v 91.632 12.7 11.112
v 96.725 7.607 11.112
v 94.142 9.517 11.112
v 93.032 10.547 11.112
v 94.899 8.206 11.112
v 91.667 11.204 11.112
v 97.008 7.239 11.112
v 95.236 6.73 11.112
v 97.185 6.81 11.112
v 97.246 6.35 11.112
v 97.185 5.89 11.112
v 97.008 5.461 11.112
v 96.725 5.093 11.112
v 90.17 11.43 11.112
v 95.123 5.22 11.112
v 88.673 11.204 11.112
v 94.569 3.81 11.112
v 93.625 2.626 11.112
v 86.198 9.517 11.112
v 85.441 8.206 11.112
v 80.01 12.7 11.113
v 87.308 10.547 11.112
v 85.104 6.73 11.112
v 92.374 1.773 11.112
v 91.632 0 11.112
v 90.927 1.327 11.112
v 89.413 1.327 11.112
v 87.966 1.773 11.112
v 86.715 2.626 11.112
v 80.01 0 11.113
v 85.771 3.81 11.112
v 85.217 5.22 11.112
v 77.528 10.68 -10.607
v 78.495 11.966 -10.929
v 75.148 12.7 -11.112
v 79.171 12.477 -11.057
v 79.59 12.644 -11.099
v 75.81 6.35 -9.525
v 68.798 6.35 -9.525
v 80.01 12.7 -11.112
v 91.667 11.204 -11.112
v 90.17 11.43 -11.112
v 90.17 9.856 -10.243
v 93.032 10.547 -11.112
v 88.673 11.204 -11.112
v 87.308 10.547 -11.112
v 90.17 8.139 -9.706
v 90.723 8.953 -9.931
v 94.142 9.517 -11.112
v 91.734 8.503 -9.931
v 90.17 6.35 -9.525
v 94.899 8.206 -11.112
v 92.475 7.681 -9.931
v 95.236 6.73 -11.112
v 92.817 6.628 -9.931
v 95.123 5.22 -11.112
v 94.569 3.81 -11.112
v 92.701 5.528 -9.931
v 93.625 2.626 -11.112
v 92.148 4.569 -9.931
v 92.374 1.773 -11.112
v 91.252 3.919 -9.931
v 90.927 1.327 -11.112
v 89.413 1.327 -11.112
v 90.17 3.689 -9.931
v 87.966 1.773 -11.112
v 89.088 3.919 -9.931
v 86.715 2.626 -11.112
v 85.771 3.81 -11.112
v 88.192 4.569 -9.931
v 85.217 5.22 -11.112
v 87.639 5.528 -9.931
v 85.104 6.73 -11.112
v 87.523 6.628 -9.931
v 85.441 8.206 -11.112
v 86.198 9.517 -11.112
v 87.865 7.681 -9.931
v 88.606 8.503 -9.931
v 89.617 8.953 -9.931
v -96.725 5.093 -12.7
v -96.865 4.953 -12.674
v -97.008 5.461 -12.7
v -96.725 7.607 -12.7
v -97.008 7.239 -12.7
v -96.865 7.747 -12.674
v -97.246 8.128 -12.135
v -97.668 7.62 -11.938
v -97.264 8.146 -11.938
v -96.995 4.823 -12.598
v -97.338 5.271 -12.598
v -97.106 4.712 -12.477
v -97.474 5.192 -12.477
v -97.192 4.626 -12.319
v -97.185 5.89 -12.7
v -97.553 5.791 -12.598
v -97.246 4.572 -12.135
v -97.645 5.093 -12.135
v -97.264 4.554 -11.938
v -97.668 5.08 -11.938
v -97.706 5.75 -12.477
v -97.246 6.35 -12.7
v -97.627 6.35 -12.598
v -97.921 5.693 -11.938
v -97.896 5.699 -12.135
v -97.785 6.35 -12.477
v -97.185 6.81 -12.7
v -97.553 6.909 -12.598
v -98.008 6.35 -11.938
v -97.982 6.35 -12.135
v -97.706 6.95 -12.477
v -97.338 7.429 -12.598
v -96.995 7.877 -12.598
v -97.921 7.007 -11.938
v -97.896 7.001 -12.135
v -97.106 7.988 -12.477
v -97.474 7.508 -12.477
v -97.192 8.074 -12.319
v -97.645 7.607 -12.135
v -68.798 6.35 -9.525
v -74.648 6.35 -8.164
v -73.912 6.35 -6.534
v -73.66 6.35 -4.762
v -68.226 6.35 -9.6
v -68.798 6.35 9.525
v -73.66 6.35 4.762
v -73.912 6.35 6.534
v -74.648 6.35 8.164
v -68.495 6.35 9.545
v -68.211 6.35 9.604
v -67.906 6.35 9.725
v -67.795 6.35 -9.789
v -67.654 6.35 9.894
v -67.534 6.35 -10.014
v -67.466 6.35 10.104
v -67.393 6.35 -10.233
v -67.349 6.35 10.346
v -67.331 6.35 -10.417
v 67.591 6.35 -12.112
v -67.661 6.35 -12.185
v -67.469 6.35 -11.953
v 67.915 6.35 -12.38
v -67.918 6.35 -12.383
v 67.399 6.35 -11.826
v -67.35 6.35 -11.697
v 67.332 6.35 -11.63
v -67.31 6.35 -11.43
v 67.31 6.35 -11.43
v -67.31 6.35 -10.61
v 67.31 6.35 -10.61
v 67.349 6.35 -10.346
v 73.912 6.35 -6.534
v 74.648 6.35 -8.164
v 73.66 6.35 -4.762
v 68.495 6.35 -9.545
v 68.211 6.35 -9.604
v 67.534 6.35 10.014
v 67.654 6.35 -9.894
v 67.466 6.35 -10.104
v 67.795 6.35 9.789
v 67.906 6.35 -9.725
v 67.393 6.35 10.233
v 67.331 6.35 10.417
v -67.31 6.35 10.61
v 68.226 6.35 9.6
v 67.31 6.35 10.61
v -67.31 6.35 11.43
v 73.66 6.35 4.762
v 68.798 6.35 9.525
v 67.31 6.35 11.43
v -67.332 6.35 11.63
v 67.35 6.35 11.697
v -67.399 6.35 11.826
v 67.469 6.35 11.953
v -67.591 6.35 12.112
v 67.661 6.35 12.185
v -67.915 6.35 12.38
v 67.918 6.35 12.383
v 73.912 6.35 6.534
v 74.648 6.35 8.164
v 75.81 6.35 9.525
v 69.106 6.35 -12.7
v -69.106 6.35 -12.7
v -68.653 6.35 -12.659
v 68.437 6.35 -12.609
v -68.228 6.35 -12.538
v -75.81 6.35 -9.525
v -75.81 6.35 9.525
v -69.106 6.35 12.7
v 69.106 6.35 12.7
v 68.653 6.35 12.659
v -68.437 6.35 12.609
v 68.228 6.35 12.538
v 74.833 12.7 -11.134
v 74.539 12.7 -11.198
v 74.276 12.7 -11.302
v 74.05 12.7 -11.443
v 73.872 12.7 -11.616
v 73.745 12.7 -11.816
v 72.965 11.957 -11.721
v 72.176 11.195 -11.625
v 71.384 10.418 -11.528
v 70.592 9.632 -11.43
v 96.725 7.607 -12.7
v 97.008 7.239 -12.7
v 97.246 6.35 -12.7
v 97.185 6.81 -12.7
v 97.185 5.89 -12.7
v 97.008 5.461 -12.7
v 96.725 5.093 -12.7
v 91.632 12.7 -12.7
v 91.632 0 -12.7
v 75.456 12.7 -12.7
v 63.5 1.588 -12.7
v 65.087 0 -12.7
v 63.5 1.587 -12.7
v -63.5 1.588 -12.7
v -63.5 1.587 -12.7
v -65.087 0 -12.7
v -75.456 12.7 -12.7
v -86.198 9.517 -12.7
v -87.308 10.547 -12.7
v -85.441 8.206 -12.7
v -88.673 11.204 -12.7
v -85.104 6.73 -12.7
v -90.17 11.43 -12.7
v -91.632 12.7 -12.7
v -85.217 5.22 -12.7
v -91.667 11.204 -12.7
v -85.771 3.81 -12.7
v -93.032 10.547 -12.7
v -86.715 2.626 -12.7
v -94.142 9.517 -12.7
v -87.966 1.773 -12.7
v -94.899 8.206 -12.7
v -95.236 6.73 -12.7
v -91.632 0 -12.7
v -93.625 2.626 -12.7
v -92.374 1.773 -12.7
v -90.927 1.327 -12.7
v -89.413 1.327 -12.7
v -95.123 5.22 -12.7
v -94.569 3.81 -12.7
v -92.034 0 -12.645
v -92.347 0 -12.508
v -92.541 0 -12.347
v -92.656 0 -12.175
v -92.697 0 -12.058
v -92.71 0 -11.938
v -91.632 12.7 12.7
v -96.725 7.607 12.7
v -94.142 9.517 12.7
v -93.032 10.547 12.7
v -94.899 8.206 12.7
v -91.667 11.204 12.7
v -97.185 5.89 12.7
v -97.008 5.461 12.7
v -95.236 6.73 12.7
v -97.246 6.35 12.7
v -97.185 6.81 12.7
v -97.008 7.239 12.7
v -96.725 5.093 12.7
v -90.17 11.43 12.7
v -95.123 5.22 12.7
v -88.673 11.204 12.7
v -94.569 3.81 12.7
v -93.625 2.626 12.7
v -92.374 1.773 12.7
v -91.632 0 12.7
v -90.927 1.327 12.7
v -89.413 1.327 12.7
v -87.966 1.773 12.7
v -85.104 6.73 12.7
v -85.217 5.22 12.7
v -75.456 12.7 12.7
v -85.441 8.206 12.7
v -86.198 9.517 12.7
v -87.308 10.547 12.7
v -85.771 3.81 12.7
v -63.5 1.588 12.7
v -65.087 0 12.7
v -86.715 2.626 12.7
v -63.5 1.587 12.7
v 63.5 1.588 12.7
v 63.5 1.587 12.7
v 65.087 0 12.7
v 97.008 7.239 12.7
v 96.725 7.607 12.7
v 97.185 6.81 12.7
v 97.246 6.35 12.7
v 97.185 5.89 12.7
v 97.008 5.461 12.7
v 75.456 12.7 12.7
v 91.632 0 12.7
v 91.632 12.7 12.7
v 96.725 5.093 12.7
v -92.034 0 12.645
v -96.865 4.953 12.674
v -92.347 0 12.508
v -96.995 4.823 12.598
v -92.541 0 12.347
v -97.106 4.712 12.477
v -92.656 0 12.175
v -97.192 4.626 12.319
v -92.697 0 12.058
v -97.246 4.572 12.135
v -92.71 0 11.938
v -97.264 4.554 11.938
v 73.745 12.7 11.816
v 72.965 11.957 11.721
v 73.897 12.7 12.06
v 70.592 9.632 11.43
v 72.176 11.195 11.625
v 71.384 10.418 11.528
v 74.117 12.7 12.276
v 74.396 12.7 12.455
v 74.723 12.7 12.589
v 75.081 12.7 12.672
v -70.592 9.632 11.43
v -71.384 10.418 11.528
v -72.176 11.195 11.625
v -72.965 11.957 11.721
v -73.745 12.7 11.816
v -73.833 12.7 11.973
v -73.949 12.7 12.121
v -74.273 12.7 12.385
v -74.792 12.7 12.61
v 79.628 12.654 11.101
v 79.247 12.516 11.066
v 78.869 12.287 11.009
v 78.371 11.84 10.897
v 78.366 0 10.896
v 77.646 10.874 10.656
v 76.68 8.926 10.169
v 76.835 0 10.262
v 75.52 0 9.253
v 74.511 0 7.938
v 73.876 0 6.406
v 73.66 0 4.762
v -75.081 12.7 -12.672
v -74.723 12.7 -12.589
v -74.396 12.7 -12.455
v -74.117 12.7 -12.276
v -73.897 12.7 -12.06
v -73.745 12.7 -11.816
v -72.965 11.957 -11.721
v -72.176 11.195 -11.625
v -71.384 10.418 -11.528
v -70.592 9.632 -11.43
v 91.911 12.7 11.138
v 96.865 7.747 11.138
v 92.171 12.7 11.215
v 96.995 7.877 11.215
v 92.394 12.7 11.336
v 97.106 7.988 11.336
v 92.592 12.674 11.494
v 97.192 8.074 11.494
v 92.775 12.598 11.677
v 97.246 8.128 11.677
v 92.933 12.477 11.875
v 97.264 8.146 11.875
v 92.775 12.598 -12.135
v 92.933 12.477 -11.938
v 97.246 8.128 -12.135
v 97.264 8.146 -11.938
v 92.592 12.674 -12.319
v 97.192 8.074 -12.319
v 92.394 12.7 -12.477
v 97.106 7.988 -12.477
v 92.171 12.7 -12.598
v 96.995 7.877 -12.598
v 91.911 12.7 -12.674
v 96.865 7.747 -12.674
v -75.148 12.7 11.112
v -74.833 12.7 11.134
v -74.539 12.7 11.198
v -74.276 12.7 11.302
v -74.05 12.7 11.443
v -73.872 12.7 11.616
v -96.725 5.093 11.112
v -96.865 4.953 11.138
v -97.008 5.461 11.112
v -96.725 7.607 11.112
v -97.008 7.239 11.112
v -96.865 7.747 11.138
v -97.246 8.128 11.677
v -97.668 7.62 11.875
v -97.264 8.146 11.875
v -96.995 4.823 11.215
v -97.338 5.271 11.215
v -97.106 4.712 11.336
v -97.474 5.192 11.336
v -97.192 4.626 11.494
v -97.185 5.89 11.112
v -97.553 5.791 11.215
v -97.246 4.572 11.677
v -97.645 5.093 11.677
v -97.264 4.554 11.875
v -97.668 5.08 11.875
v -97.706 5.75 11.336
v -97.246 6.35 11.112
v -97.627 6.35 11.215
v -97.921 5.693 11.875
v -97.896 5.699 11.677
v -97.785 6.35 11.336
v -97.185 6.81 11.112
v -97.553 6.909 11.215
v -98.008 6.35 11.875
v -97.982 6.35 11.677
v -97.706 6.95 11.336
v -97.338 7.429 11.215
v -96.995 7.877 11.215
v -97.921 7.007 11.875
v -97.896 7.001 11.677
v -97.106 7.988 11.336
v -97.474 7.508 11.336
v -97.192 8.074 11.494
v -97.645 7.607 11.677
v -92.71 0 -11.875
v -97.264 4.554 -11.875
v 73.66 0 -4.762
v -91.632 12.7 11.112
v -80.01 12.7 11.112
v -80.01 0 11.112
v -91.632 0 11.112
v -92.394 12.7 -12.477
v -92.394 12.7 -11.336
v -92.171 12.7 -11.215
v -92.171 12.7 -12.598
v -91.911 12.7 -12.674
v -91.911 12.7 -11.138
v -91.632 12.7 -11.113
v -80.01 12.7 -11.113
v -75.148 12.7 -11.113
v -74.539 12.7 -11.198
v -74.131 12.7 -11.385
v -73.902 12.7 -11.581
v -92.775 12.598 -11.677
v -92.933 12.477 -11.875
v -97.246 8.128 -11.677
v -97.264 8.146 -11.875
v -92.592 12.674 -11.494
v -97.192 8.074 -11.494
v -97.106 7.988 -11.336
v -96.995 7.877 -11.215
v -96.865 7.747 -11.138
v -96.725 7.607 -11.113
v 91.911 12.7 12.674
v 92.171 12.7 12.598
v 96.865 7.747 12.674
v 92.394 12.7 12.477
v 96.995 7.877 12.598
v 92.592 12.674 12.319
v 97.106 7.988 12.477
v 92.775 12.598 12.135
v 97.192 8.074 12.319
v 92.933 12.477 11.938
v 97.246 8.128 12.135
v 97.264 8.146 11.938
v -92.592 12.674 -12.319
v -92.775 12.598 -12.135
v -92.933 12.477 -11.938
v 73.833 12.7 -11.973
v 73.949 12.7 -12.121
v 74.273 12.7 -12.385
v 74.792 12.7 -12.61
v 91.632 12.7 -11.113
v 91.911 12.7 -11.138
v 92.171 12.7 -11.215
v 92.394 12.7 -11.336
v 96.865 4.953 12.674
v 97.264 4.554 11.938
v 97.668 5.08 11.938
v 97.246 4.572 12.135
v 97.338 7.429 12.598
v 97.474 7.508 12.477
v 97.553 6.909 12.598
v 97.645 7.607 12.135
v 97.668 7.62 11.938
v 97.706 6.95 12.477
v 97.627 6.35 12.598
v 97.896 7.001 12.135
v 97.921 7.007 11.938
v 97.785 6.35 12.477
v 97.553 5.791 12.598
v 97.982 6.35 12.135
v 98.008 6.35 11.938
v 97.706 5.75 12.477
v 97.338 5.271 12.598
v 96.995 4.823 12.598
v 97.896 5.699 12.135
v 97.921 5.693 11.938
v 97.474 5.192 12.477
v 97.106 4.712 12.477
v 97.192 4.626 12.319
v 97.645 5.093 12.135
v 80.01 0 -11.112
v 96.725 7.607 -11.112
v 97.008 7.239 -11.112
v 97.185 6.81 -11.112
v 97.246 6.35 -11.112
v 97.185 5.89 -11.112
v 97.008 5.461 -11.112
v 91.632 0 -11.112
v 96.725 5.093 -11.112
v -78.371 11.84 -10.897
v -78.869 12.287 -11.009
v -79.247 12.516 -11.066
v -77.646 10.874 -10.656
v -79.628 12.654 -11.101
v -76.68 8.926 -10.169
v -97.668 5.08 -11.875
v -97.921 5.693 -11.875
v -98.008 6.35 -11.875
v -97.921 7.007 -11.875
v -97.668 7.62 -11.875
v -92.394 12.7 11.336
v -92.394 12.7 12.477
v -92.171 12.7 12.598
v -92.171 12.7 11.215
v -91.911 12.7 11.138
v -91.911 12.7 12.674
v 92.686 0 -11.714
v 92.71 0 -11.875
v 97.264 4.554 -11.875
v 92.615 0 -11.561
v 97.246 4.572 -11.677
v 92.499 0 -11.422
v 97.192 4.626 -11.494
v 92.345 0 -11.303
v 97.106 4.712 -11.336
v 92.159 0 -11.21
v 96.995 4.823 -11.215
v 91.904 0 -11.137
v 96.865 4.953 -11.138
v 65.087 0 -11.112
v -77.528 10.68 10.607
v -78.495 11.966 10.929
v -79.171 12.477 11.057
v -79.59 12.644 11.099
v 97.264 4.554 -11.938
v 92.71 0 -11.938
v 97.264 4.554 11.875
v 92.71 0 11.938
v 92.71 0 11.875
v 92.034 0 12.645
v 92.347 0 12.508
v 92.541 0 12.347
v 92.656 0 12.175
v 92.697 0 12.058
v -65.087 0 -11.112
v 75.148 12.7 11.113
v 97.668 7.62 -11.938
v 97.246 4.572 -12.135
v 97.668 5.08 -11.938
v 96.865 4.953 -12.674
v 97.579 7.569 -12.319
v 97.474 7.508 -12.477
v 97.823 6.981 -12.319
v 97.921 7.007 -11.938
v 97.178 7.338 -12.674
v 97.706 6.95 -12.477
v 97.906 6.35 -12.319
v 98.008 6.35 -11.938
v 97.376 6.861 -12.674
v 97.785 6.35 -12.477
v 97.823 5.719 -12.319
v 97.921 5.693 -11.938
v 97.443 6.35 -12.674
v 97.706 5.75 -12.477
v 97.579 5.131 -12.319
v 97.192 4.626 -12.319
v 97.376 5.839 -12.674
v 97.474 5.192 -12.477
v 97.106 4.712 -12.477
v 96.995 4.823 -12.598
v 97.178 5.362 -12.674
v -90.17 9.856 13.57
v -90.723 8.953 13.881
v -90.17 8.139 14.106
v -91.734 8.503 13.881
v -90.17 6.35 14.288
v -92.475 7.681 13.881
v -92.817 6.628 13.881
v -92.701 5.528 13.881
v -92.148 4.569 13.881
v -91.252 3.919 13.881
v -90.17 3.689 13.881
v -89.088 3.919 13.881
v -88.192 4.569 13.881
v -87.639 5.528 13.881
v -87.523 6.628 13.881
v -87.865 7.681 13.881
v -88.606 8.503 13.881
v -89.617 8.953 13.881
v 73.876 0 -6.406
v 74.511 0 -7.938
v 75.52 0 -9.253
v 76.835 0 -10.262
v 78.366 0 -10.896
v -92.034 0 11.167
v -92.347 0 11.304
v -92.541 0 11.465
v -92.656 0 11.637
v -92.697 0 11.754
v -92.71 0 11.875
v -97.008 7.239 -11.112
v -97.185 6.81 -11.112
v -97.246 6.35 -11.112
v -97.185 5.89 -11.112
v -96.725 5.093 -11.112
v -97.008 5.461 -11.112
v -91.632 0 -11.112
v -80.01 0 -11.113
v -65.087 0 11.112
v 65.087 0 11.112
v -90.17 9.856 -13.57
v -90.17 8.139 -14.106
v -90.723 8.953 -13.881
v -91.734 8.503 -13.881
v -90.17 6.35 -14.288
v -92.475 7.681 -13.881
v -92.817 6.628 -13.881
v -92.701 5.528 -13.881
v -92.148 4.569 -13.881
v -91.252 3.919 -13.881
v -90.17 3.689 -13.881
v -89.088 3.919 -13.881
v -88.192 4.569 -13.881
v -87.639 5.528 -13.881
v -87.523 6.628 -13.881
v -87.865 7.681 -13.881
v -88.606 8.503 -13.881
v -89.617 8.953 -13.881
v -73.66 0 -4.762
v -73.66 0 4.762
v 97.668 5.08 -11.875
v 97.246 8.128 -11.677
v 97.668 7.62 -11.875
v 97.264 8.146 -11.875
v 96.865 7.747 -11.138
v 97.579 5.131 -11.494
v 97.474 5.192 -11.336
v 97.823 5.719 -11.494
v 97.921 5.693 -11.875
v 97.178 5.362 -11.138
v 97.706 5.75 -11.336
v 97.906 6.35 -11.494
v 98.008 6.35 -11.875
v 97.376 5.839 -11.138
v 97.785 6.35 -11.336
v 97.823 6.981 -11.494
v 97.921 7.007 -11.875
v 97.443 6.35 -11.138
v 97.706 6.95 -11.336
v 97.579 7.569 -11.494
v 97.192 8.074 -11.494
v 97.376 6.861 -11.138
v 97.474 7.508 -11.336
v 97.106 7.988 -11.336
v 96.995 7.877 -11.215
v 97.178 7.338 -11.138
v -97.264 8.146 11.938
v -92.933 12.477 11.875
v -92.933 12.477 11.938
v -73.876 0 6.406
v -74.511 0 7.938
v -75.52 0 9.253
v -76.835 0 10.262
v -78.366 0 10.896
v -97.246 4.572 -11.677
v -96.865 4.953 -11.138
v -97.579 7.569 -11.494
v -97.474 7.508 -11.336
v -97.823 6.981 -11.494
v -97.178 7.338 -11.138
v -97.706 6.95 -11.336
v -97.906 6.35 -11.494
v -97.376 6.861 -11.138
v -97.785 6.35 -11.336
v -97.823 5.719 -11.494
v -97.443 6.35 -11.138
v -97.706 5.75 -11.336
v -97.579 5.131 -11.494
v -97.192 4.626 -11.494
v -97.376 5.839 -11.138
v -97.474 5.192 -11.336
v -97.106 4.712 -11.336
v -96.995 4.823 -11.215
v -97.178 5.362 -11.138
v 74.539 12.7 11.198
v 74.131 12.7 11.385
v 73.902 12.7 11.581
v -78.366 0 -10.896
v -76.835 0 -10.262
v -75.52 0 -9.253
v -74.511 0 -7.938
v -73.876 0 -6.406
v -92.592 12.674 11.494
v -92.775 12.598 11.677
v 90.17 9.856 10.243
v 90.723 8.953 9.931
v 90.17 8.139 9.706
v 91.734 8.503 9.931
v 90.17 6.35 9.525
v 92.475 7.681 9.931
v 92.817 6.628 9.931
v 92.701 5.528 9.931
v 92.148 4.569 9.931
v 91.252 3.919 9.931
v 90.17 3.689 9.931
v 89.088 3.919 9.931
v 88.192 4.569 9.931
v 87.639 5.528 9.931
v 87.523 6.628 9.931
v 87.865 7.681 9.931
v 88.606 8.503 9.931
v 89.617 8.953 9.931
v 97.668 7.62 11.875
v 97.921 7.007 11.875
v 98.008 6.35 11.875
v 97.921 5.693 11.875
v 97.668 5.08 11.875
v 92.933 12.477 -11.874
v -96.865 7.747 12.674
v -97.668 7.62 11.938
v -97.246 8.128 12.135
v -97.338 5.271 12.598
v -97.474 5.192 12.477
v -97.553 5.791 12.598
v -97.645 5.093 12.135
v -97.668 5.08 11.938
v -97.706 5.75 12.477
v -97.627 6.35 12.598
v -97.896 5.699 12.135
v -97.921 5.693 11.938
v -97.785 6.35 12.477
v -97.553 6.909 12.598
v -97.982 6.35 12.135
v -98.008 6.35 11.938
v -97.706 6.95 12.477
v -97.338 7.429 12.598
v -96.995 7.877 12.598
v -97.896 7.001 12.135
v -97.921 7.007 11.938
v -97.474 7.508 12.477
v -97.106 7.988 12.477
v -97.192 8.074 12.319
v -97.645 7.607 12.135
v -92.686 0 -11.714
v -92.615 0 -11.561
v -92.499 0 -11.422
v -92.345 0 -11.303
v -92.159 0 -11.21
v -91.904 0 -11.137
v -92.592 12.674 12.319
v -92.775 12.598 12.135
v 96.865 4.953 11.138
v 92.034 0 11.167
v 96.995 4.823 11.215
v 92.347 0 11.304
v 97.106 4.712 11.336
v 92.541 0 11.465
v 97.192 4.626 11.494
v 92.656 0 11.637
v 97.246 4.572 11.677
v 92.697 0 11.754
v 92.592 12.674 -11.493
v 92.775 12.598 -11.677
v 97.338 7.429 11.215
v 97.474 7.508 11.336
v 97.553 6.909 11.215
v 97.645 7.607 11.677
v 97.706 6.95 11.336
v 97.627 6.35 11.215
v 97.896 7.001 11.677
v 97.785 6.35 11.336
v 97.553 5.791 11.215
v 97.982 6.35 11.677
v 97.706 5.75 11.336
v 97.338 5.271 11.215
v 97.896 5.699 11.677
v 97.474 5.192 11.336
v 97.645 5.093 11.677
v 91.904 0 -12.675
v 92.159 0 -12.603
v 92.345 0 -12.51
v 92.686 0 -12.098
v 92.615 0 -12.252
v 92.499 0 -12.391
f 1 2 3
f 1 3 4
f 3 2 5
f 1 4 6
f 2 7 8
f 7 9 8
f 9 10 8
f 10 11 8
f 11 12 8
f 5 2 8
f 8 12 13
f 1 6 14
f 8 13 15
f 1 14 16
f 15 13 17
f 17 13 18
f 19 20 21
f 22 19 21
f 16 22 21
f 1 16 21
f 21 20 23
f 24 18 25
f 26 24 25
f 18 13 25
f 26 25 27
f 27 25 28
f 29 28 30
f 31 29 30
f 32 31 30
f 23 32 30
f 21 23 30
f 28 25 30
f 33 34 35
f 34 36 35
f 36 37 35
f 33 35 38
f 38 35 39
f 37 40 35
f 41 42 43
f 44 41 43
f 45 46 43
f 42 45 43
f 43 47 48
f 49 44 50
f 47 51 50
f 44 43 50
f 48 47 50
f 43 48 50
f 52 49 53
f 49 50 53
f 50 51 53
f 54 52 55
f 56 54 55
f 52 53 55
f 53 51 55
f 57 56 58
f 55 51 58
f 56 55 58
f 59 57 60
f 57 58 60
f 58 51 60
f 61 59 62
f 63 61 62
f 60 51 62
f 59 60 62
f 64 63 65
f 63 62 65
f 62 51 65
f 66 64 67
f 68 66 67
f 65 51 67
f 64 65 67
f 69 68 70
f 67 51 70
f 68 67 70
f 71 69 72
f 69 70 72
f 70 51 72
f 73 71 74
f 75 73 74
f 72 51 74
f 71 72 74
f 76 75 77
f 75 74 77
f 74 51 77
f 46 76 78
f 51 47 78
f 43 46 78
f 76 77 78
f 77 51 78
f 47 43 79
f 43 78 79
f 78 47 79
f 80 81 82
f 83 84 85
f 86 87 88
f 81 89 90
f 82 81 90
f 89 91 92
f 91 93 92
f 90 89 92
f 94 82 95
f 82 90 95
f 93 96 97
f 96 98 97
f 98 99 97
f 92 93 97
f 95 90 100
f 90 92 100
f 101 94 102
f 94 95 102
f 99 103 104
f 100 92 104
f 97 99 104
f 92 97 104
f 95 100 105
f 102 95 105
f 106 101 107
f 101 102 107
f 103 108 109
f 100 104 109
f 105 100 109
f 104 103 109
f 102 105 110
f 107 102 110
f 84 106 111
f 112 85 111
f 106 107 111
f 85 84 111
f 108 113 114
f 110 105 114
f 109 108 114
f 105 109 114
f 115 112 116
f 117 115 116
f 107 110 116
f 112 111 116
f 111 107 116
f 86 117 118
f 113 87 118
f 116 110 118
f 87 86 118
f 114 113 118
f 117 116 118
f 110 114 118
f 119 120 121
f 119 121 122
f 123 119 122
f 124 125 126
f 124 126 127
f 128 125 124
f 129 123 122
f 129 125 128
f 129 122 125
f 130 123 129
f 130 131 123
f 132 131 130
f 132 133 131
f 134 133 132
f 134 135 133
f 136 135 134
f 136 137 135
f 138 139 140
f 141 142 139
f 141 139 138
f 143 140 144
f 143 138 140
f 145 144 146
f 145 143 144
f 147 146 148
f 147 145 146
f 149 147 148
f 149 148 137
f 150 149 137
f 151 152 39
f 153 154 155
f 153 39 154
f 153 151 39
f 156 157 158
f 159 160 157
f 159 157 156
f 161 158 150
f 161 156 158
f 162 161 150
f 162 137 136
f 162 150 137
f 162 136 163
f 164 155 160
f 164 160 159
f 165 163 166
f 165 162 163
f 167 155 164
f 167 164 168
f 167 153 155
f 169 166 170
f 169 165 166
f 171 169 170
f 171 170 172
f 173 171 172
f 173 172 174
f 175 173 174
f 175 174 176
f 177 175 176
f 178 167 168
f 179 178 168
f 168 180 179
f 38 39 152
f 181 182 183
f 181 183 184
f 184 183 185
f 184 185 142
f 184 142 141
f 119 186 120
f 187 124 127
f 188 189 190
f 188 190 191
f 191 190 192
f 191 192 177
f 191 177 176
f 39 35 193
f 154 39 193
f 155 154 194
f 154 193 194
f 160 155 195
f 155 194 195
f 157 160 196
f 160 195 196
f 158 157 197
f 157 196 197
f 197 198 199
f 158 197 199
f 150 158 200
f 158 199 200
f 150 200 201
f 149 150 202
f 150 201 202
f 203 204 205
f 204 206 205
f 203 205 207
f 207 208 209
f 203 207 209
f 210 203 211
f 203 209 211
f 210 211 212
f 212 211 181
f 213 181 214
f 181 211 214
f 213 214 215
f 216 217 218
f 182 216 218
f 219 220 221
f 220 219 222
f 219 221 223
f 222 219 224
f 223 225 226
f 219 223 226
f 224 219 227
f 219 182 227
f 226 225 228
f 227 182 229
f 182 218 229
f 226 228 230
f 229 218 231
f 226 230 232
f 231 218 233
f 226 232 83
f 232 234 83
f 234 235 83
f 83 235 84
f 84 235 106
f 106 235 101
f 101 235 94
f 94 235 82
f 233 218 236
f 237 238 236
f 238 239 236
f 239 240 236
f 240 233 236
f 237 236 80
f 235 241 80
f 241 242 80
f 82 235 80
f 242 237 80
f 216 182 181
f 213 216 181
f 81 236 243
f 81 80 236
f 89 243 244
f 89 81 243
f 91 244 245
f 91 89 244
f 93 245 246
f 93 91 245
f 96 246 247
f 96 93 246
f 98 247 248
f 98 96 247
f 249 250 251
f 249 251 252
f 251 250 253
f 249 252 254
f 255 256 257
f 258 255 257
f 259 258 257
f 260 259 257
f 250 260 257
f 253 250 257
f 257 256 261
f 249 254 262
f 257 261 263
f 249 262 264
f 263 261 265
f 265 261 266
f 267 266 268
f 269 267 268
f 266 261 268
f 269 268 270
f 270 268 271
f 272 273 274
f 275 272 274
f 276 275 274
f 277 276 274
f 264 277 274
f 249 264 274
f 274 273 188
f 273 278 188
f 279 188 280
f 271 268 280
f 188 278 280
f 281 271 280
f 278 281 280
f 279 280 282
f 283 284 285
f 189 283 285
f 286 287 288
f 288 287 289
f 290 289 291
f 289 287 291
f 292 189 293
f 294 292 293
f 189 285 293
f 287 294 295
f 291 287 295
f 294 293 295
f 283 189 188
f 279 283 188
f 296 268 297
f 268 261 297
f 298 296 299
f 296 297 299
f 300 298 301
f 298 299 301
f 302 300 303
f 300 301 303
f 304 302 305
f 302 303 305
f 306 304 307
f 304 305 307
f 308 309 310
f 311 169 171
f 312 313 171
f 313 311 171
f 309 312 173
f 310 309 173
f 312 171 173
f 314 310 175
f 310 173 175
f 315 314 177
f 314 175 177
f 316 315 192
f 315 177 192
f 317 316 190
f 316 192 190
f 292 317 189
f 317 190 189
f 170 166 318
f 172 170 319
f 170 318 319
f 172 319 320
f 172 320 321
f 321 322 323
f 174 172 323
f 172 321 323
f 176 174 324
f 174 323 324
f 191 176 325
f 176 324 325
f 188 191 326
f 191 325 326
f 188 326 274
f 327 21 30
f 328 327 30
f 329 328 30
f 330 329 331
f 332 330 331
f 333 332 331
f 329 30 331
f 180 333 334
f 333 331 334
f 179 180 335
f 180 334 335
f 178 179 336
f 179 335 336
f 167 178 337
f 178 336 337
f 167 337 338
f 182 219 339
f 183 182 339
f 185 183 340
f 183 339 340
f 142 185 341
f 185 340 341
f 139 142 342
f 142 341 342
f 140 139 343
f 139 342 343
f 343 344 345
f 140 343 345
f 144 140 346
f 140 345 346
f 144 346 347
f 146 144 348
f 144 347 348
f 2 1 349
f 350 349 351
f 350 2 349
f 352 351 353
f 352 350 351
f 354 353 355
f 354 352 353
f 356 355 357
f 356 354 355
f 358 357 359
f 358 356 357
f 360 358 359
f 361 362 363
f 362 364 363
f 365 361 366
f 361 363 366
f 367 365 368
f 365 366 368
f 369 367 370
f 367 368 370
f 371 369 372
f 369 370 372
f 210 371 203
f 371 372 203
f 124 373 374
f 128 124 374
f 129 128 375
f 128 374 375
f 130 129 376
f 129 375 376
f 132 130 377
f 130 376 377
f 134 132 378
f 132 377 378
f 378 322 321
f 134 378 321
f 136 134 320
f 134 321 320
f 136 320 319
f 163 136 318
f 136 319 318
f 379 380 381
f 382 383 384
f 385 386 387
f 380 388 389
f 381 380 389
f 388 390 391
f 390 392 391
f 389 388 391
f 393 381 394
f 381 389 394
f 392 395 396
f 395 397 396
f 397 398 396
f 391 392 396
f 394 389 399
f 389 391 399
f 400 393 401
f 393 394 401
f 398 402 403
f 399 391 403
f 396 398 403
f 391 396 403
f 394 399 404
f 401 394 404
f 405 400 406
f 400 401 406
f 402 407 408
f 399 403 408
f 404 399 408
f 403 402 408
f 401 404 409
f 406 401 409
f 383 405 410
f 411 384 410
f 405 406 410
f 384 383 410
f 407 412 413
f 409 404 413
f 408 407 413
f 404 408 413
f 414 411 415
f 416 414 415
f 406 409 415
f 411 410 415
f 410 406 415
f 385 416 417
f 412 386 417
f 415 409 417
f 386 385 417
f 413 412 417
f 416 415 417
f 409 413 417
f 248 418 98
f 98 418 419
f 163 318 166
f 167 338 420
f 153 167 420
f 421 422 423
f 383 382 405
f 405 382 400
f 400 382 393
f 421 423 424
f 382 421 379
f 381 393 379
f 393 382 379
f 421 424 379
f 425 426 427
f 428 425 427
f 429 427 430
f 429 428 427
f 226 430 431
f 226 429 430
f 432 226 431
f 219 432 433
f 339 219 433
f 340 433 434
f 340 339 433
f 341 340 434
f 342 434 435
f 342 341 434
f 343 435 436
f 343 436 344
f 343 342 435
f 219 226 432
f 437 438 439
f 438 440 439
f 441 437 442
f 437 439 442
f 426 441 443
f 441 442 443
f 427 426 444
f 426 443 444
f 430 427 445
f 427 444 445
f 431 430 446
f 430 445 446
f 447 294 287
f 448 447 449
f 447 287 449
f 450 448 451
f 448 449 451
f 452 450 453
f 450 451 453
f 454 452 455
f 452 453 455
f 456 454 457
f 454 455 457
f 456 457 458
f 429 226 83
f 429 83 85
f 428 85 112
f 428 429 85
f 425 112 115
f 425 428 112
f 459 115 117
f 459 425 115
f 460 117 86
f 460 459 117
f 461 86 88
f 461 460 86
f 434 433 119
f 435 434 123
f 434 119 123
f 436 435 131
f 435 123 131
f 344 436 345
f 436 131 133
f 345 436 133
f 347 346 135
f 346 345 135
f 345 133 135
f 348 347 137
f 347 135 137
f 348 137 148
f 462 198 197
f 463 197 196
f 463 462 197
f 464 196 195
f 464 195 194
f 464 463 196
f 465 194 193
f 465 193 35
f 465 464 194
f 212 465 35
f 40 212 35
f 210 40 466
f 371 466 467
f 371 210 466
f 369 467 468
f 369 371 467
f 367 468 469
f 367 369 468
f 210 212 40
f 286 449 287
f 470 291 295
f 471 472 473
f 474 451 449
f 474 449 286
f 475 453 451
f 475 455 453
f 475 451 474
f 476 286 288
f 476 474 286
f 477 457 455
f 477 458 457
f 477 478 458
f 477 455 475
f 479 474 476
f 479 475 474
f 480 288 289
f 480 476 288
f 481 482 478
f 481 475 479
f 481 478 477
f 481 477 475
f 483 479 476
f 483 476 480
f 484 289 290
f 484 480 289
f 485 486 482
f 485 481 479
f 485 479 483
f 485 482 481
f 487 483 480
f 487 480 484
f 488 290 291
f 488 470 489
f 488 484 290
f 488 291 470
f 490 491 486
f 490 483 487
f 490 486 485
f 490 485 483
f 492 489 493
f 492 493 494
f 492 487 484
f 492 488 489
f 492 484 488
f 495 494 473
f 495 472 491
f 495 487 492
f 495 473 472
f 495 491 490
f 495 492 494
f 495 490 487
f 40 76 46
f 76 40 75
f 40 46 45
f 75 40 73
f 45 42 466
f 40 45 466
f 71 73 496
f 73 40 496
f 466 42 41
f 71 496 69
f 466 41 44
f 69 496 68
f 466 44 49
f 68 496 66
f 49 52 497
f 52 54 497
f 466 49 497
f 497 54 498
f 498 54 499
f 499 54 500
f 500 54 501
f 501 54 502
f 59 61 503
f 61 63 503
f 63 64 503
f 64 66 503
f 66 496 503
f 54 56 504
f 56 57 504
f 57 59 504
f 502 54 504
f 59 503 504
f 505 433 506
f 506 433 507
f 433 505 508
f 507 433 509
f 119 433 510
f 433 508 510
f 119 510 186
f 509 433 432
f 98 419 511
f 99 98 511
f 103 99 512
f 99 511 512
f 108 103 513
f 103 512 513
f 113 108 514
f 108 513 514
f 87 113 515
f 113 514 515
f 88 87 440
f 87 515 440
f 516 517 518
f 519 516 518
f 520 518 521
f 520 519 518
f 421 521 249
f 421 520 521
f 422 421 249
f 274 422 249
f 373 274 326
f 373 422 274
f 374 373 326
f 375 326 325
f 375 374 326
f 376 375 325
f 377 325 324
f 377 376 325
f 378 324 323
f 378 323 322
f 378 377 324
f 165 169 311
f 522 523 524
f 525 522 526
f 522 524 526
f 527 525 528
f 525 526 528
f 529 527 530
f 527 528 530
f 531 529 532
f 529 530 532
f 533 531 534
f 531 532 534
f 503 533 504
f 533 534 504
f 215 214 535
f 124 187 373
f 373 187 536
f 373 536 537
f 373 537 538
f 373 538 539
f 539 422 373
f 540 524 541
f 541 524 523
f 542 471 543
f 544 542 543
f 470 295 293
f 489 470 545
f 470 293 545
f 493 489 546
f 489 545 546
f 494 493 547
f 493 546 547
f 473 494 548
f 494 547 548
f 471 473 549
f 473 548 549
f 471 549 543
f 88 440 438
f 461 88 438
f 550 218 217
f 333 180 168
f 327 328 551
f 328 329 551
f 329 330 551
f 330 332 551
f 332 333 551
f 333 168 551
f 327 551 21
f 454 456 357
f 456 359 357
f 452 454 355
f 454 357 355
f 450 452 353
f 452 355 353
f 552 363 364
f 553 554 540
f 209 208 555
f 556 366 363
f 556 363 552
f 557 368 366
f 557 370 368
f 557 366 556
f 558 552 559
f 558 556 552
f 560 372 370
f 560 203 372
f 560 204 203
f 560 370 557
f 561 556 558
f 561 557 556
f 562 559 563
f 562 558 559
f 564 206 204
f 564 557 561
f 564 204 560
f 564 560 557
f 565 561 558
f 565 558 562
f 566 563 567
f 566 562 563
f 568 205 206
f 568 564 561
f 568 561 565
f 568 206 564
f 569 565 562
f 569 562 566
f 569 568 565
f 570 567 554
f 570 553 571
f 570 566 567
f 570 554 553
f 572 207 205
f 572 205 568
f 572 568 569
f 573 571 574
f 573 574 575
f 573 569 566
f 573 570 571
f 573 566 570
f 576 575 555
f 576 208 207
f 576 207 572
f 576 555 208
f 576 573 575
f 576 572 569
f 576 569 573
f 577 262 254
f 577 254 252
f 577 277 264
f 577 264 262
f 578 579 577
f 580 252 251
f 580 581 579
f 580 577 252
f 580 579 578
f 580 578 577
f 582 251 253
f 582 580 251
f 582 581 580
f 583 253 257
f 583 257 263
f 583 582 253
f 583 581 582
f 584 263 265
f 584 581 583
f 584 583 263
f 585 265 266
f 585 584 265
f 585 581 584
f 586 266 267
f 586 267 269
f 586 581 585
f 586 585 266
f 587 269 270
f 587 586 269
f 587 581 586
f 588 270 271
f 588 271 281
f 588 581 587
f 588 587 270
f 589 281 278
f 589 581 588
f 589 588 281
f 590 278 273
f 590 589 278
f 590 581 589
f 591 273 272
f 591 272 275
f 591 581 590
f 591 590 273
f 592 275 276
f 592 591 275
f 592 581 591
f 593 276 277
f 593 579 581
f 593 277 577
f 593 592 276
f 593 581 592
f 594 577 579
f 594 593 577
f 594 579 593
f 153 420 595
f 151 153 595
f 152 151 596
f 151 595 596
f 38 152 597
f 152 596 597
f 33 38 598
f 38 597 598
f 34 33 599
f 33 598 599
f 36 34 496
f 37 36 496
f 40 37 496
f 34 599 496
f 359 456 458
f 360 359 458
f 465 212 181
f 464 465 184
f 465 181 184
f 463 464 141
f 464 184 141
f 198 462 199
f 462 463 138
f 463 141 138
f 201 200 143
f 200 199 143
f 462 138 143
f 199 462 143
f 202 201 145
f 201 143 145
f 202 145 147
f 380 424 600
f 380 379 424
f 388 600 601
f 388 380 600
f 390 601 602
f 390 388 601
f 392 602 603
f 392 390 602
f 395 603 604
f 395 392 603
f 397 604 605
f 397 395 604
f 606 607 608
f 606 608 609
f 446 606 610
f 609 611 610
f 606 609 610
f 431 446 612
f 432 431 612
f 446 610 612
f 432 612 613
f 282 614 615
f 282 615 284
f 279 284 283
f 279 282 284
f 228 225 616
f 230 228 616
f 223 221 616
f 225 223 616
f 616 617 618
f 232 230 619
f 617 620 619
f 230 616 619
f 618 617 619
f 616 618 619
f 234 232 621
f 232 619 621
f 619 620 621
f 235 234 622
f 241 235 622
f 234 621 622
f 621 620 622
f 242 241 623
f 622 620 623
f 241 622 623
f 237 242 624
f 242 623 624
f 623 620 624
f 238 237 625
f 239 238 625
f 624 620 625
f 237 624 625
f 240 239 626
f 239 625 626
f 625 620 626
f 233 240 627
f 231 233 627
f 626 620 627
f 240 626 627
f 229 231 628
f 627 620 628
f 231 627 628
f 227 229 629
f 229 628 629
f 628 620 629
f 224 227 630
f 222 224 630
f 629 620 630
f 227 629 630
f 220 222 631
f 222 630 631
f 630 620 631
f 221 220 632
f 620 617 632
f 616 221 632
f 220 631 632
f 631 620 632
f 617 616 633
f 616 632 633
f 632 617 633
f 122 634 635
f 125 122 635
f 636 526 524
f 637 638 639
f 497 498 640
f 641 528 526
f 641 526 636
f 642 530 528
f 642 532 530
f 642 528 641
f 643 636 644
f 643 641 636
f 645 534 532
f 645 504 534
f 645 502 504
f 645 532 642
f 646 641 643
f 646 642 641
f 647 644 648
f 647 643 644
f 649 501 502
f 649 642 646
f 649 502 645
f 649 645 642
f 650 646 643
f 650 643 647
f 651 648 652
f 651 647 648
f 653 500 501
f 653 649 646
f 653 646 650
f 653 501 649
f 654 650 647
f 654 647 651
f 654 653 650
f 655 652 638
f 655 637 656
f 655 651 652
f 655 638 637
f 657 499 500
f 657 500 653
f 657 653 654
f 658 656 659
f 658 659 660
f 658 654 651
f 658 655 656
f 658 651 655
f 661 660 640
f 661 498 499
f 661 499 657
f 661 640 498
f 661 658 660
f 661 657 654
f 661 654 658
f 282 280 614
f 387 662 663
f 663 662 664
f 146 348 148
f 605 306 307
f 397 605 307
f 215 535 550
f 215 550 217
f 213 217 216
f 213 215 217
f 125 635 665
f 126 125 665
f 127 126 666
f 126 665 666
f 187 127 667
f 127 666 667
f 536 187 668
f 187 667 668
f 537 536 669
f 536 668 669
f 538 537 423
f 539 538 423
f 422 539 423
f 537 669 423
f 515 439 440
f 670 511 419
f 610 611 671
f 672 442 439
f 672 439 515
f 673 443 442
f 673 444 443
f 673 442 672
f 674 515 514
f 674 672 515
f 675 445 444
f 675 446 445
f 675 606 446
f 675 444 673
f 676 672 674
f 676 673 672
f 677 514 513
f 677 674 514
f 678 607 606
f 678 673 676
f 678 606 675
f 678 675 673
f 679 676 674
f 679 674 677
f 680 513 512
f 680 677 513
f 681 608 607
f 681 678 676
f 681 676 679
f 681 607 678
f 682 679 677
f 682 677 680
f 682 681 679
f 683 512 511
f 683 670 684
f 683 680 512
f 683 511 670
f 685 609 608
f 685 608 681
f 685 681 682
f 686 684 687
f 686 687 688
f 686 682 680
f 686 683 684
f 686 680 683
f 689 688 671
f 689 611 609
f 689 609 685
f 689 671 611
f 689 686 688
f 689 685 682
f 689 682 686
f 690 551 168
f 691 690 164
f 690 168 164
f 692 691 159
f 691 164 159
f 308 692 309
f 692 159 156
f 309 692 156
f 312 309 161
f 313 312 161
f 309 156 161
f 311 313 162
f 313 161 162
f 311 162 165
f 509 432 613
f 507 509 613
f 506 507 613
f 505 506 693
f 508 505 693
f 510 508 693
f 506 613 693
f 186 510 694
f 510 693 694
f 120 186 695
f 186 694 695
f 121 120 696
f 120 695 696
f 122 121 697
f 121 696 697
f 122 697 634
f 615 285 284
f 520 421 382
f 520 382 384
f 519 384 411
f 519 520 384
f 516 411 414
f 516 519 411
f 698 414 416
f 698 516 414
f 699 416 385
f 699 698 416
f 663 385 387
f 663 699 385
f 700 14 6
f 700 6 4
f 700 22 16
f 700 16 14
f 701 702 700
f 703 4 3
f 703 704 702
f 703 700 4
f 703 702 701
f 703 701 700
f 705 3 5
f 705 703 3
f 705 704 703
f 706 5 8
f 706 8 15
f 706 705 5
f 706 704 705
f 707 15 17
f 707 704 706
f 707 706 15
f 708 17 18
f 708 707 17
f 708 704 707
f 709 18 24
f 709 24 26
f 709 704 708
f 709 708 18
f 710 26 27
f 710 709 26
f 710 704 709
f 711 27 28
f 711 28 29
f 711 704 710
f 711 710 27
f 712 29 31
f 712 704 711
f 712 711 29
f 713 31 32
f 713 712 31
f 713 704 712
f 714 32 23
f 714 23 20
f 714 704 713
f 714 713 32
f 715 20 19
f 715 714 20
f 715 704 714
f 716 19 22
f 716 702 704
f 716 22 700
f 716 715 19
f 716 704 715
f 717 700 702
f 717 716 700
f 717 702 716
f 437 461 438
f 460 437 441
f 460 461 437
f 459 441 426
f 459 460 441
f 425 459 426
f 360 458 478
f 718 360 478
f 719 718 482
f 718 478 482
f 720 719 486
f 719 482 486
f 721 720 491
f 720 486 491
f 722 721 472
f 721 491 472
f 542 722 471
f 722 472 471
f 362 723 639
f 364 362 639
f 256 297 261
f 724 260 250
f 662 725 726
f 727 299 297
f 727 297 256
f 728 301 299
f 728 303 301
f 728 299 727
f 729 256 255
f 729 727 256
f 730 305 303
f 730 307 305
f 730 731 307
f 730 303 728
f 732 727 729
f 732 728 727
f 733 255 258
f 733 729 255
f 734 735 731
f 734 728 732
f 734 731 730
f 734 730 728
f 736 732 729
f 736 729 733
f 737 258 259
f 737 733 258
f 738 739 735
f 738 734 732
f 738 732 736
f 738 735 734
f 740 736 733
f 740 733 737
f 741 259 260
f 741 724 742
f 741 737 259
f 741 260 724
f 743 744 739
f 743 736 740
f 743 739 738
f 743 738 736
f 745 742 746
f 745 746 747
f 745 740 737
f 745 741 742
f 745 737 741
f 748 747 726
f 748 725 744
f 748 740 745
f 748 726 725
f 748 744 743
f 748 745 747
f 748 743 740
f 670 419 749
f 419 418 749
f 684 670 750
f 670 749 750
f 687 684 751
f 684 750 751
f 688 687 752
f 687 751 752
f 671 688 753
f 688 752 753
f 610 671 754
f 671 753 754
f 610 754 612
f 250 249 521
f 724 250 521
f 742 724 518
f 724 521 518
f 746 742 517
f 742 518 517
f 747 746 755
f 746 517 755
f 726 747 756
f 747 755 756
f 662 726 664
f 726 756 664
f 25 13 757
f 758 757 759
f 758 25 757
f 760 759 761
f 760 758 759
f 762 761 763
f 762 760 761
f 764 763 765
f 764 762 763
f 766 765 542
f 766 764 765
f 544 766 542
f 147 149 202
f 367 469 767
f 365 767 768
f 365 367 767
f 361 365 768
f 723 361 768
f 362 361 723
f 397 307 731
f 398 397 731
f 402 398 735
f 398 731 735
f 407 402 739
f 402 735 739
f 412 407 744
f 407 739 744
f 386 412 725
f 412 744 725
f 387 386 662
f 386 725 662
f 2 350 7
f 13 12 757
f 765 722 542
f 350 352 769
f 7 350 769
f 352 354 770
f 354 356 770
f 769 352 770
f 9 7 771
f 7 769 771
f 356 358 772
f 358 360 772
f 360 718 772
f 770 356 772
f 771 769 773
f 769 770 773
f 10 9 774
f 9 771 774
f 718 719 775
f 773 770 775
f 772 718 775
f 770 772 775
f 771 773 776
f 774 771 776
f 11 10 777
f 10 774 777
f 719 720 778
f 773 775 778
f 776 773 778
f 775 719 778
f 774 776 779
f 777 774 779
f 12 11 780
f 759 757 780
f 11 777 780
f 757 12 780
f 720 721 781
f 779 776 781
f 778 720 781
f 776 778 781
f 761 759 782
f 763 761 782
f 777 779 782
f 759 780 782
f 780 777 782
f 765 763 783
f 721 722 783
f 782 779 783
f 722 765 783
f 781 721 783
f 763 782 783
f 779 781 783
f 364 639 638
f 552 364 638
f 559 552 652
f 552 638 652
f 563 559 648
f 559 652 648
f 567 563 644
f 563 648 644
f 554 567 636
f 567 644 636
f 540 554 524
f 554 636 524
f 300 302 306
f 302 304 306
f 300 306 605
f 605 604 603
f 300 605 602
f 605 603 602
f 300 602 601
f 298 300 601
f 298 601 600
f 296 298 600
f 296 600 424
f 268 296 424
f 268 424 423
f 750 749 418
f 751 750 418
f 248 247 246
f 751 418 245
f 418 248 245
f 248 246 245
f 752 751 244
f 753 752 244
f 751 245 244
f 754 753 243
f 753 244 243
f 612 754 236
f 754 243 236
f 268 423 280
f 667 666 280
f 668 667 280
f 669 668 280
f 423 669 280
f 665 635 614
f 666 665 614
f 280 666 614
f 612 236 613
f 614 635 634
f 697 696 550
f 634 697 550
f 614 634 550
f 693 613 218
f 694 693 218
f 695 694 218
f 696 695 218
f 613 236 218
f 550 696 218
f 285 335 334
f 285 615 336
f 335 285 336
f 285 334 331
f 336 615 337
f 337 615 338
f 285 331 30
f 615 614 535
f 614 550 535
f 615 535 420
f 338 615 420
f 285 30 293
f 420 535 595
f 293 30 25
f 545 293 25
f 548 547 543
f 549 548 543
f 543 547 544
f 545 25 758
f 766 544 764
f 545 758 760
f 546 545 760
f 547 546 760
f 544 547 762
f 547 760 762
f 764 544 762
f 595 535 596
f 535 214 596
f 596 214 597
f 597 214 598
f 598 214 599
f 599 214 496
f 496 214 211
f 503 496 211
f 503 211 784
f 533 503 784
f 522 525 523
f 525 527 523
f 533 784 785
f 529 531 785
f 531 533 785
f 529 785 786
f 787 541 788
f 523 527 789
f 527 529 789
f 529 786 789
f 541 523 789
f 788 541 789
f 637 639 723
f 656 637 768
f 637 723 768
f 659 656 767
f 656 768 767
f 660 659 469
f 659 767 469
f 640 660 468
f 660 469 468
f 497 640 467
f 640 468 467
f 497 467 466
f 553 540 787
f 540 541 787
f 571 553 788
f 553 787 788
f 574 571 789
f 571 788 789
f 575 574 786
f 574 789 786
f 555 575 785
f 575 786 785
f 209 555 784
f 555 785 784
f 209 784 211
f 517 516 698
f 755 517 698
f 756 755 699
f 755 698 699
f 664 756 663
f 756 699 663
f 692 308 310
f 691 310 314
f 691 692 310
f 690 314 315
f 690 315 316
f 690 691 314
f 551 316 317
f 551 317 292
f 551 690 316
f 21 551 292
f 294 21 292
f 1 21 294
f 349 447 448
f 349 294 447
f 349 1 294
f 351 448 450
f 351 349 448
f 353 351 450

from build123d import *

# Parameters (mm, degrees)
BOSS_EXTRUDE1_DEPTH = 12.7
CUT_EXTRUDE2_DEPTH  = 199.932436772
CUT_EXTRUDE1_DEPTH  = 104.050150898
CUT_EXTRUDE3_DEPTH  = 63.5
CHAMFER1_SIZE       = 1.5875
FILLET1_R           = 0.762
FILLET2_R           = 1.27


# Some blends are built 0.0001 mm under size
with BuildPart() as part:
    # Sketch1 → Boss-Extrude1 (new body)
    with BuildSketch(Plane(origin=(0, 0, 0), x_dir=(1, 0, 0), z_dir=(0, 1, 0))):
        with BuildLine():
            Line((-99.06, -12.7), (99.06, -12.7))
            Line((99.06, -12.7), (99.06, -11.1125))
            Line((99.06, -11.1125), (80.01, -11.1125))
            ThreePointArc((80.01, -11.1125), (75.519871939, -9.252628061), (73.66, -4.7625))
            Line((73.66, -4.7625), (73.66, 4.7625))
            ThreePointArc((73.66, 4.7625), (75.519871939, 9.252628061), (80.01, 11.1125))
            Line((80.01, 11.1125), (99.06, 11.1125))
            Line((99.06, 11.1125), (99.06, 12.7))
            Line((99.06, 12.7), (-99.06, 12.7))
            Line((-99.06, 12.7), (-99.06, 11.1125))
            Line((-99.06, 11.1125), (-80.01, 11.1125))
            ThreePointArc((-80.01, 11.1125), (-75.519871939, 9.252628061), (-73.66, 4.7625))
            Line((-73.66, 4.7625), (-73.66, -4.7625))
            ThreePointArc((-73.66, -4.7625), (-75.519871939, -9.252628061), (-80.01, -11.1125))
            Line((-80.01, -11.1125), (-99.06, -11.1125))
            Line((-99.06, -11.1125), (-99.06, -12.7))
        make_face()
    extrude(amount=BOSS_EXTRUDE1_DEPTH)

    # Sketch3 → Cut-Extrude2 (cut, through all)
    with BuildSketch(Plane.ZY.offset(99.06)):
        Polygon((11.1125, 12.7), (4.7625, 12.7), (-4.7625, 12.7), (-11.1125, 12.7), (-9.525, 6.35), (9.525, 6.35), align=None)
    extrude(amount=-CUT_EXTRUDE2_DEPTH, mode=Mode.SUBTRACT)

    # Sketch2 → Cut-Extrude1 (cut, through all)
    with BuildSketch(Plane.XY.offset(12.7)):
        Polygon((73.66, 12.7), (-73.66, 12.7), (-67.31, 6.35), (67.31, 6.35), align=None)
        with BuildLine():
            Line((97.263948776, 4.553948776), (92.71, 0))
            Line((92.71, 0), (99.06, 0))
            Line((99.06, 0), (99.06, 12.7))
            Line((99.06, 12.7), (92.71, 12.7))
            Line((92.71, 12.7), (97.263948776, 8.146051224))
            ThreePointArc((97.263948776, 8.146051224), (98.007897552, 6.35), (97.263948776, 4.553948776))
        make_face()
        with BuildLine():
            ThreePointArc((-97.263948776, 4.553948776), (-98.007897552, 6.35), (-97.263948776, 8.146051224))
            Line((-97.263948776, 8.146051224), (-92.71, 12.7))
            Line((-92.71, 12.7), (-99.06, 12.7))
            Line((-99.06, 12.7), (-99.06, 0))
            Line((-99.06, 0), (-92.71, 0))
            Line((-92.71, 0), (-97.263948776, 4.553948776))
        make_face()
    extrude(amount=-CUT_EXTRUDE1_DEPTH, mode=Mode.SUBTRACT)

    # Sketch4 → Revolve1 (revolve)
    with BuildSketch(Plane.ZY.offset(90.17)):
        with BuildLine():
            Line((12.7, 6.35), (12.7, 11.43))
            ThreePointArc((12.7, 11.43), (13.881381744, 9.01113492), (14.2875, 6.35))
            Line((14.2875, 6.35), (12.7, 6.35))
        make_face()
    revolve1 = revolve(axis=Axis((-90.17, 6.35, 0), (0, 0, 1)))

    # Mirror1: Revolve1 across plane
    add(revolve1.mirror(Plane.XY))

    # Sketch5 → Revolve2 (revolve)
    with BuildSketch(Plane(origin=(90.17, 0, 0), x_dir=(0, 0, -1), z_dir=(1, 0, 0))):
        with BuildLine():
            Line((11.1125, 6.35), (11.1125, 11.43))
            ThreePointArc((11.1125, 11.43), (9.931118256, 9.01113492), (9.525, 6.35))
            Line((9.525, 6.35), (11.1125, 6.35))
        make_face()
    revolve2 = revolve(axis=Axis((90.17, 6.35, 0), (0, 0, -1)))

    # Mirror2: Revolve2 across plane
    add(revolve2.mirror(Plane.XY))

    # Sketch6 → Cut-Extrude3 (cut, symmetric)
    with BuildSketch(Plane(origin=(0, 0, 0), x_dir=(0, 0, -1), z_dir=(1, 0, 0))):
        Polygon((-12.7, 0), (-11.1125, 0), (-12.7, 1.5875), align=None)
        Polygon((11.1125, 0), (12.7, 1.5875), (12.7, 0), align=None)
    extrude(amount=CUT_EXTRUDE3_DEPTH, both=True, mode=Mode.SUBTRACT)

    # Chamfer1
    chamfer1_edges = [part.edges().sort_by_distance(p)[0] for p in [
        (63.5, 0, 11.90625),
        (63.5, 0, -11.90625),
        (-63.5, 0, -11.90625),
        (-63.5, 0, 11.90625),
    ]]
    chamfer(chamfer1_edges, length=CHAMFER1_SIZE - 0.0001)  # a hair under: the kernel refuses the full size

    # Fillet1
    fillet1_edges = [part.edges().sort_by_distance(p)[0] for p in [
        (-98.007897552, 6.35, 12.7),
        (-92.71, 12.7, -11.90625),
        (-94.986974388, 10.423025612, -11.1125),
        (-94.986974388, 10.423025612, -12.7),
        (-94.986974388, 10.423025612, 11.1125),
        (-92.71, 12.7, 11.90625),
        (-94.986974388, 2.276974388, 12.7),
        (-98.007897552, 6.35, -11.1125),
        (-98.007897552, 6.35, 11.1125),
        (-94.986974388, 2.276974388, -11.1125),
        (-94.986974388, 2.276974388, 11.1125),
        (-98.007897552, 6.35, -12.7),
        (-94.986974388, 2.276974388, -12.7),
        (-94.986974388, 10.423025612, 12.7),
        (98.007897552, 6.35, 12.7),
        (92.71, 12.7, 11.90625),
        (92.71, 12.7, -11.90625),
        (94.986974388, 10.423025612, 12.7),
        (94.986974388, 2.276974388, 11.1125),
        (94.986974388, 2.276974388, -11.1125),
        (94.986974388, 2.276974388, -12.7),
        (98.007897552, 6.35, 11.1125),
        (94.986974388, 10.423025612, 11.1125),
        (94.986974388, 10.423025612, -11.1125),
        (98.007897552, 6.35, -12.7),
        (94.986974388, 10.423025612, -12.7),
        (94.986974388, 2.276974388, 12.7),
        (98.007897552, 6.35, -11.1125),
    ]]
    fillet(fillet1_edges, radius=FILLET1_R)

    # Fillet2
    # the kernel refuses this fillet: 1.27 mm, written as the material it takes off along each edge
    with BuildSketch(Plane(origin=(-75.90506403, 14.94506403, -12.7), x_dir=(-0.7071067811865446, -0.7071067811865505, 0), z_dir=(0.7071067811865506, -0.7071067811865446, 0))) as fillet2_piece_1_section:
        with BuildLine():
            CenterArc((FILLET2_R, -FILLET2_R), FILLET2_R, 90, 90)
            Line((0, -FILLET2_R), (0, 0))
            Line((0, 0), (FILLET2_R, 0))
        make_face()
    fillet2_piece_1 = extrude(amount=15.330256121, mode=Mode.PRIVATE)
    fillet2_piece_1 = split(fillet2_piece_1, bisect_by=Plane(origin=(-71.905795305, 6.35, -12.408746665), z_dir=(0, 1, 0)), keep=Keep.TOP, mode=Mode.PRIVATE)
    add(fillet2_piece_1, mode=Mode.SUBTRACT)
    with BuildSketch(Plane(origin=(-65.450815483, 4.490815483, -9.060203871), x_dir=(0.1230914909792504, -0.12309149097924957, -0.9847319278346824), z_dir=(-0.696310623822809, 0.6963106238228031, -0.17407765595558086))) as fillet2_piece_2_section:
        with BuildLine():
            CenterArc((FILLET2_R * 0.840960781889, FILLET2_R), FILLET2_R, 189.874961398, 80.125038602)
            Line((-FILLET2_R * 0.144223584254, FILLET2_R * 0.828501414858), (0, 0))
            Line((0, 0), (FILLET2_R * 0.840960781889, 0))
        make_face()
    fillet2_piece_2 = extrude(amount=14.459594166, mode=Mode.PRIVATE)
    fillet2_piece_2 = split(fillet2_piece_2, bisect_by=Plane(origin=(-71.646234354, 6.35, -10.770930609), z_dir=(0, 1, 0)), keep=Keep.TOP, mode=Mode.PRIVATE)
    add(fillet2_piece_2, mode=Mode.SUBTRACT)
    with BuildSketch(Plane(origin=(-75.519184517, 14.559184517, 11.577296129), x_dir=(-0.7177405625652845, -0.6755205294731655, -0.1688801323683837), z_dir=(0.69631062382278, -0.6963106238227741, -0.17407765595581334))) as fillet2_piece_3_section:
        with BuildLine():
            CenterArc((FILLET2_R * 0.840960781889, -FILLET2_R), FILLET2_R, 90, 80.125038602)
            Line((-FILLET2_R * 0.144223584254, -FILLET2_R * 0.828501414857), (0, 0))
            Line((0, 0), (FILLET2_R * 0.840960781889, 0))
        make_face()
    fillet2_piece_3 = extrude(amount=14.459594166, mode=Mode.PRIVATE)
    fillet2_piece_3 = split(fillet2_piece_3, bisect_by=Plane(origin=(-71.646234354, 6.35, 10.770930609), z_dir=(0, 1, 0)), keep=Keep.TOP, mode=Mode.PRIVATE)
    add(fillet2_piece_3, mode=Mode.SUBTRACT)
    with BuildSketch(Plane(origin=(-75.90506403, 14.94506403, 12.7), x_dir=(-0.7071067811865445, -0.7071067811865505, 0), z_dir=(0.7071067811865506, -0.7071067811865446, 0))) as fillet2_piece_4_section:
        with BuildLine():
            CenterArc((FILLET2_R, FILLET2_R), FILLET2_R, 180, 90)
            Line((0, FILLET2_R), (0, 0))
            Line((0, 0), (FILLET2_R, 0))
        make_face()
    fillet2_piece_4 = extrude(amount=15.330256121, mode=Mode.PRIVATE)
    fillet2_piece_4 = split(fillet2_piece_4, bisect_by=Plane(origin=(-71.905795305, 6.35, 12.408746665), z_dir=(0, 1, 0)), keep=Keep.TOP, mode=Mode.PRIVATE)
    add(fillet2_piece_4, mode=Mode.SUBTRACT)
    with BuildSketch(Plane(origin=(65.06493597, 4.10493597, -12.7), x_dir=(0.7071067811865445, -0.7071067811865506, 0), z_dir=(0.7071067811865506, 0.7071067811865445, 0))) as fillet2_piece_5_section:
        with BuildLine():
            CenterArc((FILLET2_R, -FILLET2_R), FILLET2_R, 90, 90)
            Line((0, -FILLET2_R), (0, 0))
            Line((0, 0), (FILLET2_R, 0))
        make_face()
    fillet2_piece_5 = extrude(amount=15.330256121, mode=Mode.PRIVATE)
    fillet2_piece_5 = split(fillet2_piece_5, bisect_by=Plane(origin=(71.905795305, 6.35, -12.408746665), z_dir=(0, 1, 0)), keep=Keep.TOP, mode=Mode.PRIVATE)
    add(fillet2_piece_5, mode=Mode.SUBTRACT)
    with BuildSketch(Plane(origin=(75.519184517, 14.559184517, -11.577296129), x_dir=(-0.12309149097927001, -0.12309149097926336, -0.9847319278346782), z_dir=(-0.6963106238228061, -0.6963106238228001, 0.17407765595560445))) as fillet2_piece_6_section:
        with BuildLine():
            CenterArc((FILLET2_R * 0.840960781889, FILLET2_R), FILLET2_R, 189.874961398, 80.125038602)
            Line((-FILLET2_R * 0.144223584254, FILLET2_R * 0.828501414858), (0, 0))
            Line((0, 0), (FILLET2_R * 0.84096078189, 0))
        make_face()
    fillet2_piece_6 = extrude(amount=14.459594166, mode=Mode.PRIVATE)
    fillet2_piece_6 = split(fillet2_piece_6, bisect_by=Plane(origin=(71.646234354, 6.35, -10.770930609), z_dir=(0, 1, 0)), keep=Keep.TOP, mode=Mode.PRIVATE)
    add(fillet2_piece_6, mode=Mode.SUBTRACT)
    with BuildSketch(Plane(origin=(65.06493597, 4.10493597, 12.7), x_dir=(0.7071067811865445, -0.7071067811865507, 0), z_dir=(0.7071067811865506, 0.7071067811865445, 0))) as fillet2_piece_7_section:
        with BuildLine():
            CenterArc((FILLET2_R, FILLET2_R), FILLET2_R, 180, 90)
            Line((0, FILLET2_R), (0, 0))
            Line((0, 0), (FILLET2_R, 0))
        make_face()
    fillet2_piece_7 = extrude(amount=15.330256121, mode=Mode.PRIVATE)
    fillet2_piece_7 = split(fillet2_piece_7, bisect_by=Plane(origin=(71.905795305, 6.35, 12.408746665), z_dir=(0, 1, 0)), keep=Keep.TOP, mode=Mode.PRIVATE)
    add(fillet2_piece_7, mode=Mode.SUBTRACT)
    with BuildSketch(Plane(origin=(65.450815483, 4.490815483, 9.060203871), x_dir=(0.7177405625652817, -0.6755205294731627, -0.16888013236840813), z_dir=(0.6963106238227829, 0.6963106238227769, 0.1740776559557897))) as fillet2_piece_8_section:
        with BuildLine():
            CenterArc((FILLET2_R * 0.840960781889, -FILLET2_R), FILLET2_R, 90, 80.125038602)
            Line((-FILLET2_R * 0.144223584254, -FILLET2_R * 0.828501414857), (0, 0))
            Line((0, 0), (FILLET2_R * 0.840960781889, 0))
        make_face()
    fillet2_piece_8 = extrude(amount=14.459594166, mode=Mode.PRIVATE)
    fillet2_piece_8 = split(fillet2_piece_8, bisect_by=Plane(origin=(71.646234354, 6.35, 10.770930609), z_dir=(0, 1, 0)), keep=Keep.TOP, mode=Mode.PRIVATE)
    add(fillet2_piece_8, mode=Mode.SUBTRACT)


solid = part.part
